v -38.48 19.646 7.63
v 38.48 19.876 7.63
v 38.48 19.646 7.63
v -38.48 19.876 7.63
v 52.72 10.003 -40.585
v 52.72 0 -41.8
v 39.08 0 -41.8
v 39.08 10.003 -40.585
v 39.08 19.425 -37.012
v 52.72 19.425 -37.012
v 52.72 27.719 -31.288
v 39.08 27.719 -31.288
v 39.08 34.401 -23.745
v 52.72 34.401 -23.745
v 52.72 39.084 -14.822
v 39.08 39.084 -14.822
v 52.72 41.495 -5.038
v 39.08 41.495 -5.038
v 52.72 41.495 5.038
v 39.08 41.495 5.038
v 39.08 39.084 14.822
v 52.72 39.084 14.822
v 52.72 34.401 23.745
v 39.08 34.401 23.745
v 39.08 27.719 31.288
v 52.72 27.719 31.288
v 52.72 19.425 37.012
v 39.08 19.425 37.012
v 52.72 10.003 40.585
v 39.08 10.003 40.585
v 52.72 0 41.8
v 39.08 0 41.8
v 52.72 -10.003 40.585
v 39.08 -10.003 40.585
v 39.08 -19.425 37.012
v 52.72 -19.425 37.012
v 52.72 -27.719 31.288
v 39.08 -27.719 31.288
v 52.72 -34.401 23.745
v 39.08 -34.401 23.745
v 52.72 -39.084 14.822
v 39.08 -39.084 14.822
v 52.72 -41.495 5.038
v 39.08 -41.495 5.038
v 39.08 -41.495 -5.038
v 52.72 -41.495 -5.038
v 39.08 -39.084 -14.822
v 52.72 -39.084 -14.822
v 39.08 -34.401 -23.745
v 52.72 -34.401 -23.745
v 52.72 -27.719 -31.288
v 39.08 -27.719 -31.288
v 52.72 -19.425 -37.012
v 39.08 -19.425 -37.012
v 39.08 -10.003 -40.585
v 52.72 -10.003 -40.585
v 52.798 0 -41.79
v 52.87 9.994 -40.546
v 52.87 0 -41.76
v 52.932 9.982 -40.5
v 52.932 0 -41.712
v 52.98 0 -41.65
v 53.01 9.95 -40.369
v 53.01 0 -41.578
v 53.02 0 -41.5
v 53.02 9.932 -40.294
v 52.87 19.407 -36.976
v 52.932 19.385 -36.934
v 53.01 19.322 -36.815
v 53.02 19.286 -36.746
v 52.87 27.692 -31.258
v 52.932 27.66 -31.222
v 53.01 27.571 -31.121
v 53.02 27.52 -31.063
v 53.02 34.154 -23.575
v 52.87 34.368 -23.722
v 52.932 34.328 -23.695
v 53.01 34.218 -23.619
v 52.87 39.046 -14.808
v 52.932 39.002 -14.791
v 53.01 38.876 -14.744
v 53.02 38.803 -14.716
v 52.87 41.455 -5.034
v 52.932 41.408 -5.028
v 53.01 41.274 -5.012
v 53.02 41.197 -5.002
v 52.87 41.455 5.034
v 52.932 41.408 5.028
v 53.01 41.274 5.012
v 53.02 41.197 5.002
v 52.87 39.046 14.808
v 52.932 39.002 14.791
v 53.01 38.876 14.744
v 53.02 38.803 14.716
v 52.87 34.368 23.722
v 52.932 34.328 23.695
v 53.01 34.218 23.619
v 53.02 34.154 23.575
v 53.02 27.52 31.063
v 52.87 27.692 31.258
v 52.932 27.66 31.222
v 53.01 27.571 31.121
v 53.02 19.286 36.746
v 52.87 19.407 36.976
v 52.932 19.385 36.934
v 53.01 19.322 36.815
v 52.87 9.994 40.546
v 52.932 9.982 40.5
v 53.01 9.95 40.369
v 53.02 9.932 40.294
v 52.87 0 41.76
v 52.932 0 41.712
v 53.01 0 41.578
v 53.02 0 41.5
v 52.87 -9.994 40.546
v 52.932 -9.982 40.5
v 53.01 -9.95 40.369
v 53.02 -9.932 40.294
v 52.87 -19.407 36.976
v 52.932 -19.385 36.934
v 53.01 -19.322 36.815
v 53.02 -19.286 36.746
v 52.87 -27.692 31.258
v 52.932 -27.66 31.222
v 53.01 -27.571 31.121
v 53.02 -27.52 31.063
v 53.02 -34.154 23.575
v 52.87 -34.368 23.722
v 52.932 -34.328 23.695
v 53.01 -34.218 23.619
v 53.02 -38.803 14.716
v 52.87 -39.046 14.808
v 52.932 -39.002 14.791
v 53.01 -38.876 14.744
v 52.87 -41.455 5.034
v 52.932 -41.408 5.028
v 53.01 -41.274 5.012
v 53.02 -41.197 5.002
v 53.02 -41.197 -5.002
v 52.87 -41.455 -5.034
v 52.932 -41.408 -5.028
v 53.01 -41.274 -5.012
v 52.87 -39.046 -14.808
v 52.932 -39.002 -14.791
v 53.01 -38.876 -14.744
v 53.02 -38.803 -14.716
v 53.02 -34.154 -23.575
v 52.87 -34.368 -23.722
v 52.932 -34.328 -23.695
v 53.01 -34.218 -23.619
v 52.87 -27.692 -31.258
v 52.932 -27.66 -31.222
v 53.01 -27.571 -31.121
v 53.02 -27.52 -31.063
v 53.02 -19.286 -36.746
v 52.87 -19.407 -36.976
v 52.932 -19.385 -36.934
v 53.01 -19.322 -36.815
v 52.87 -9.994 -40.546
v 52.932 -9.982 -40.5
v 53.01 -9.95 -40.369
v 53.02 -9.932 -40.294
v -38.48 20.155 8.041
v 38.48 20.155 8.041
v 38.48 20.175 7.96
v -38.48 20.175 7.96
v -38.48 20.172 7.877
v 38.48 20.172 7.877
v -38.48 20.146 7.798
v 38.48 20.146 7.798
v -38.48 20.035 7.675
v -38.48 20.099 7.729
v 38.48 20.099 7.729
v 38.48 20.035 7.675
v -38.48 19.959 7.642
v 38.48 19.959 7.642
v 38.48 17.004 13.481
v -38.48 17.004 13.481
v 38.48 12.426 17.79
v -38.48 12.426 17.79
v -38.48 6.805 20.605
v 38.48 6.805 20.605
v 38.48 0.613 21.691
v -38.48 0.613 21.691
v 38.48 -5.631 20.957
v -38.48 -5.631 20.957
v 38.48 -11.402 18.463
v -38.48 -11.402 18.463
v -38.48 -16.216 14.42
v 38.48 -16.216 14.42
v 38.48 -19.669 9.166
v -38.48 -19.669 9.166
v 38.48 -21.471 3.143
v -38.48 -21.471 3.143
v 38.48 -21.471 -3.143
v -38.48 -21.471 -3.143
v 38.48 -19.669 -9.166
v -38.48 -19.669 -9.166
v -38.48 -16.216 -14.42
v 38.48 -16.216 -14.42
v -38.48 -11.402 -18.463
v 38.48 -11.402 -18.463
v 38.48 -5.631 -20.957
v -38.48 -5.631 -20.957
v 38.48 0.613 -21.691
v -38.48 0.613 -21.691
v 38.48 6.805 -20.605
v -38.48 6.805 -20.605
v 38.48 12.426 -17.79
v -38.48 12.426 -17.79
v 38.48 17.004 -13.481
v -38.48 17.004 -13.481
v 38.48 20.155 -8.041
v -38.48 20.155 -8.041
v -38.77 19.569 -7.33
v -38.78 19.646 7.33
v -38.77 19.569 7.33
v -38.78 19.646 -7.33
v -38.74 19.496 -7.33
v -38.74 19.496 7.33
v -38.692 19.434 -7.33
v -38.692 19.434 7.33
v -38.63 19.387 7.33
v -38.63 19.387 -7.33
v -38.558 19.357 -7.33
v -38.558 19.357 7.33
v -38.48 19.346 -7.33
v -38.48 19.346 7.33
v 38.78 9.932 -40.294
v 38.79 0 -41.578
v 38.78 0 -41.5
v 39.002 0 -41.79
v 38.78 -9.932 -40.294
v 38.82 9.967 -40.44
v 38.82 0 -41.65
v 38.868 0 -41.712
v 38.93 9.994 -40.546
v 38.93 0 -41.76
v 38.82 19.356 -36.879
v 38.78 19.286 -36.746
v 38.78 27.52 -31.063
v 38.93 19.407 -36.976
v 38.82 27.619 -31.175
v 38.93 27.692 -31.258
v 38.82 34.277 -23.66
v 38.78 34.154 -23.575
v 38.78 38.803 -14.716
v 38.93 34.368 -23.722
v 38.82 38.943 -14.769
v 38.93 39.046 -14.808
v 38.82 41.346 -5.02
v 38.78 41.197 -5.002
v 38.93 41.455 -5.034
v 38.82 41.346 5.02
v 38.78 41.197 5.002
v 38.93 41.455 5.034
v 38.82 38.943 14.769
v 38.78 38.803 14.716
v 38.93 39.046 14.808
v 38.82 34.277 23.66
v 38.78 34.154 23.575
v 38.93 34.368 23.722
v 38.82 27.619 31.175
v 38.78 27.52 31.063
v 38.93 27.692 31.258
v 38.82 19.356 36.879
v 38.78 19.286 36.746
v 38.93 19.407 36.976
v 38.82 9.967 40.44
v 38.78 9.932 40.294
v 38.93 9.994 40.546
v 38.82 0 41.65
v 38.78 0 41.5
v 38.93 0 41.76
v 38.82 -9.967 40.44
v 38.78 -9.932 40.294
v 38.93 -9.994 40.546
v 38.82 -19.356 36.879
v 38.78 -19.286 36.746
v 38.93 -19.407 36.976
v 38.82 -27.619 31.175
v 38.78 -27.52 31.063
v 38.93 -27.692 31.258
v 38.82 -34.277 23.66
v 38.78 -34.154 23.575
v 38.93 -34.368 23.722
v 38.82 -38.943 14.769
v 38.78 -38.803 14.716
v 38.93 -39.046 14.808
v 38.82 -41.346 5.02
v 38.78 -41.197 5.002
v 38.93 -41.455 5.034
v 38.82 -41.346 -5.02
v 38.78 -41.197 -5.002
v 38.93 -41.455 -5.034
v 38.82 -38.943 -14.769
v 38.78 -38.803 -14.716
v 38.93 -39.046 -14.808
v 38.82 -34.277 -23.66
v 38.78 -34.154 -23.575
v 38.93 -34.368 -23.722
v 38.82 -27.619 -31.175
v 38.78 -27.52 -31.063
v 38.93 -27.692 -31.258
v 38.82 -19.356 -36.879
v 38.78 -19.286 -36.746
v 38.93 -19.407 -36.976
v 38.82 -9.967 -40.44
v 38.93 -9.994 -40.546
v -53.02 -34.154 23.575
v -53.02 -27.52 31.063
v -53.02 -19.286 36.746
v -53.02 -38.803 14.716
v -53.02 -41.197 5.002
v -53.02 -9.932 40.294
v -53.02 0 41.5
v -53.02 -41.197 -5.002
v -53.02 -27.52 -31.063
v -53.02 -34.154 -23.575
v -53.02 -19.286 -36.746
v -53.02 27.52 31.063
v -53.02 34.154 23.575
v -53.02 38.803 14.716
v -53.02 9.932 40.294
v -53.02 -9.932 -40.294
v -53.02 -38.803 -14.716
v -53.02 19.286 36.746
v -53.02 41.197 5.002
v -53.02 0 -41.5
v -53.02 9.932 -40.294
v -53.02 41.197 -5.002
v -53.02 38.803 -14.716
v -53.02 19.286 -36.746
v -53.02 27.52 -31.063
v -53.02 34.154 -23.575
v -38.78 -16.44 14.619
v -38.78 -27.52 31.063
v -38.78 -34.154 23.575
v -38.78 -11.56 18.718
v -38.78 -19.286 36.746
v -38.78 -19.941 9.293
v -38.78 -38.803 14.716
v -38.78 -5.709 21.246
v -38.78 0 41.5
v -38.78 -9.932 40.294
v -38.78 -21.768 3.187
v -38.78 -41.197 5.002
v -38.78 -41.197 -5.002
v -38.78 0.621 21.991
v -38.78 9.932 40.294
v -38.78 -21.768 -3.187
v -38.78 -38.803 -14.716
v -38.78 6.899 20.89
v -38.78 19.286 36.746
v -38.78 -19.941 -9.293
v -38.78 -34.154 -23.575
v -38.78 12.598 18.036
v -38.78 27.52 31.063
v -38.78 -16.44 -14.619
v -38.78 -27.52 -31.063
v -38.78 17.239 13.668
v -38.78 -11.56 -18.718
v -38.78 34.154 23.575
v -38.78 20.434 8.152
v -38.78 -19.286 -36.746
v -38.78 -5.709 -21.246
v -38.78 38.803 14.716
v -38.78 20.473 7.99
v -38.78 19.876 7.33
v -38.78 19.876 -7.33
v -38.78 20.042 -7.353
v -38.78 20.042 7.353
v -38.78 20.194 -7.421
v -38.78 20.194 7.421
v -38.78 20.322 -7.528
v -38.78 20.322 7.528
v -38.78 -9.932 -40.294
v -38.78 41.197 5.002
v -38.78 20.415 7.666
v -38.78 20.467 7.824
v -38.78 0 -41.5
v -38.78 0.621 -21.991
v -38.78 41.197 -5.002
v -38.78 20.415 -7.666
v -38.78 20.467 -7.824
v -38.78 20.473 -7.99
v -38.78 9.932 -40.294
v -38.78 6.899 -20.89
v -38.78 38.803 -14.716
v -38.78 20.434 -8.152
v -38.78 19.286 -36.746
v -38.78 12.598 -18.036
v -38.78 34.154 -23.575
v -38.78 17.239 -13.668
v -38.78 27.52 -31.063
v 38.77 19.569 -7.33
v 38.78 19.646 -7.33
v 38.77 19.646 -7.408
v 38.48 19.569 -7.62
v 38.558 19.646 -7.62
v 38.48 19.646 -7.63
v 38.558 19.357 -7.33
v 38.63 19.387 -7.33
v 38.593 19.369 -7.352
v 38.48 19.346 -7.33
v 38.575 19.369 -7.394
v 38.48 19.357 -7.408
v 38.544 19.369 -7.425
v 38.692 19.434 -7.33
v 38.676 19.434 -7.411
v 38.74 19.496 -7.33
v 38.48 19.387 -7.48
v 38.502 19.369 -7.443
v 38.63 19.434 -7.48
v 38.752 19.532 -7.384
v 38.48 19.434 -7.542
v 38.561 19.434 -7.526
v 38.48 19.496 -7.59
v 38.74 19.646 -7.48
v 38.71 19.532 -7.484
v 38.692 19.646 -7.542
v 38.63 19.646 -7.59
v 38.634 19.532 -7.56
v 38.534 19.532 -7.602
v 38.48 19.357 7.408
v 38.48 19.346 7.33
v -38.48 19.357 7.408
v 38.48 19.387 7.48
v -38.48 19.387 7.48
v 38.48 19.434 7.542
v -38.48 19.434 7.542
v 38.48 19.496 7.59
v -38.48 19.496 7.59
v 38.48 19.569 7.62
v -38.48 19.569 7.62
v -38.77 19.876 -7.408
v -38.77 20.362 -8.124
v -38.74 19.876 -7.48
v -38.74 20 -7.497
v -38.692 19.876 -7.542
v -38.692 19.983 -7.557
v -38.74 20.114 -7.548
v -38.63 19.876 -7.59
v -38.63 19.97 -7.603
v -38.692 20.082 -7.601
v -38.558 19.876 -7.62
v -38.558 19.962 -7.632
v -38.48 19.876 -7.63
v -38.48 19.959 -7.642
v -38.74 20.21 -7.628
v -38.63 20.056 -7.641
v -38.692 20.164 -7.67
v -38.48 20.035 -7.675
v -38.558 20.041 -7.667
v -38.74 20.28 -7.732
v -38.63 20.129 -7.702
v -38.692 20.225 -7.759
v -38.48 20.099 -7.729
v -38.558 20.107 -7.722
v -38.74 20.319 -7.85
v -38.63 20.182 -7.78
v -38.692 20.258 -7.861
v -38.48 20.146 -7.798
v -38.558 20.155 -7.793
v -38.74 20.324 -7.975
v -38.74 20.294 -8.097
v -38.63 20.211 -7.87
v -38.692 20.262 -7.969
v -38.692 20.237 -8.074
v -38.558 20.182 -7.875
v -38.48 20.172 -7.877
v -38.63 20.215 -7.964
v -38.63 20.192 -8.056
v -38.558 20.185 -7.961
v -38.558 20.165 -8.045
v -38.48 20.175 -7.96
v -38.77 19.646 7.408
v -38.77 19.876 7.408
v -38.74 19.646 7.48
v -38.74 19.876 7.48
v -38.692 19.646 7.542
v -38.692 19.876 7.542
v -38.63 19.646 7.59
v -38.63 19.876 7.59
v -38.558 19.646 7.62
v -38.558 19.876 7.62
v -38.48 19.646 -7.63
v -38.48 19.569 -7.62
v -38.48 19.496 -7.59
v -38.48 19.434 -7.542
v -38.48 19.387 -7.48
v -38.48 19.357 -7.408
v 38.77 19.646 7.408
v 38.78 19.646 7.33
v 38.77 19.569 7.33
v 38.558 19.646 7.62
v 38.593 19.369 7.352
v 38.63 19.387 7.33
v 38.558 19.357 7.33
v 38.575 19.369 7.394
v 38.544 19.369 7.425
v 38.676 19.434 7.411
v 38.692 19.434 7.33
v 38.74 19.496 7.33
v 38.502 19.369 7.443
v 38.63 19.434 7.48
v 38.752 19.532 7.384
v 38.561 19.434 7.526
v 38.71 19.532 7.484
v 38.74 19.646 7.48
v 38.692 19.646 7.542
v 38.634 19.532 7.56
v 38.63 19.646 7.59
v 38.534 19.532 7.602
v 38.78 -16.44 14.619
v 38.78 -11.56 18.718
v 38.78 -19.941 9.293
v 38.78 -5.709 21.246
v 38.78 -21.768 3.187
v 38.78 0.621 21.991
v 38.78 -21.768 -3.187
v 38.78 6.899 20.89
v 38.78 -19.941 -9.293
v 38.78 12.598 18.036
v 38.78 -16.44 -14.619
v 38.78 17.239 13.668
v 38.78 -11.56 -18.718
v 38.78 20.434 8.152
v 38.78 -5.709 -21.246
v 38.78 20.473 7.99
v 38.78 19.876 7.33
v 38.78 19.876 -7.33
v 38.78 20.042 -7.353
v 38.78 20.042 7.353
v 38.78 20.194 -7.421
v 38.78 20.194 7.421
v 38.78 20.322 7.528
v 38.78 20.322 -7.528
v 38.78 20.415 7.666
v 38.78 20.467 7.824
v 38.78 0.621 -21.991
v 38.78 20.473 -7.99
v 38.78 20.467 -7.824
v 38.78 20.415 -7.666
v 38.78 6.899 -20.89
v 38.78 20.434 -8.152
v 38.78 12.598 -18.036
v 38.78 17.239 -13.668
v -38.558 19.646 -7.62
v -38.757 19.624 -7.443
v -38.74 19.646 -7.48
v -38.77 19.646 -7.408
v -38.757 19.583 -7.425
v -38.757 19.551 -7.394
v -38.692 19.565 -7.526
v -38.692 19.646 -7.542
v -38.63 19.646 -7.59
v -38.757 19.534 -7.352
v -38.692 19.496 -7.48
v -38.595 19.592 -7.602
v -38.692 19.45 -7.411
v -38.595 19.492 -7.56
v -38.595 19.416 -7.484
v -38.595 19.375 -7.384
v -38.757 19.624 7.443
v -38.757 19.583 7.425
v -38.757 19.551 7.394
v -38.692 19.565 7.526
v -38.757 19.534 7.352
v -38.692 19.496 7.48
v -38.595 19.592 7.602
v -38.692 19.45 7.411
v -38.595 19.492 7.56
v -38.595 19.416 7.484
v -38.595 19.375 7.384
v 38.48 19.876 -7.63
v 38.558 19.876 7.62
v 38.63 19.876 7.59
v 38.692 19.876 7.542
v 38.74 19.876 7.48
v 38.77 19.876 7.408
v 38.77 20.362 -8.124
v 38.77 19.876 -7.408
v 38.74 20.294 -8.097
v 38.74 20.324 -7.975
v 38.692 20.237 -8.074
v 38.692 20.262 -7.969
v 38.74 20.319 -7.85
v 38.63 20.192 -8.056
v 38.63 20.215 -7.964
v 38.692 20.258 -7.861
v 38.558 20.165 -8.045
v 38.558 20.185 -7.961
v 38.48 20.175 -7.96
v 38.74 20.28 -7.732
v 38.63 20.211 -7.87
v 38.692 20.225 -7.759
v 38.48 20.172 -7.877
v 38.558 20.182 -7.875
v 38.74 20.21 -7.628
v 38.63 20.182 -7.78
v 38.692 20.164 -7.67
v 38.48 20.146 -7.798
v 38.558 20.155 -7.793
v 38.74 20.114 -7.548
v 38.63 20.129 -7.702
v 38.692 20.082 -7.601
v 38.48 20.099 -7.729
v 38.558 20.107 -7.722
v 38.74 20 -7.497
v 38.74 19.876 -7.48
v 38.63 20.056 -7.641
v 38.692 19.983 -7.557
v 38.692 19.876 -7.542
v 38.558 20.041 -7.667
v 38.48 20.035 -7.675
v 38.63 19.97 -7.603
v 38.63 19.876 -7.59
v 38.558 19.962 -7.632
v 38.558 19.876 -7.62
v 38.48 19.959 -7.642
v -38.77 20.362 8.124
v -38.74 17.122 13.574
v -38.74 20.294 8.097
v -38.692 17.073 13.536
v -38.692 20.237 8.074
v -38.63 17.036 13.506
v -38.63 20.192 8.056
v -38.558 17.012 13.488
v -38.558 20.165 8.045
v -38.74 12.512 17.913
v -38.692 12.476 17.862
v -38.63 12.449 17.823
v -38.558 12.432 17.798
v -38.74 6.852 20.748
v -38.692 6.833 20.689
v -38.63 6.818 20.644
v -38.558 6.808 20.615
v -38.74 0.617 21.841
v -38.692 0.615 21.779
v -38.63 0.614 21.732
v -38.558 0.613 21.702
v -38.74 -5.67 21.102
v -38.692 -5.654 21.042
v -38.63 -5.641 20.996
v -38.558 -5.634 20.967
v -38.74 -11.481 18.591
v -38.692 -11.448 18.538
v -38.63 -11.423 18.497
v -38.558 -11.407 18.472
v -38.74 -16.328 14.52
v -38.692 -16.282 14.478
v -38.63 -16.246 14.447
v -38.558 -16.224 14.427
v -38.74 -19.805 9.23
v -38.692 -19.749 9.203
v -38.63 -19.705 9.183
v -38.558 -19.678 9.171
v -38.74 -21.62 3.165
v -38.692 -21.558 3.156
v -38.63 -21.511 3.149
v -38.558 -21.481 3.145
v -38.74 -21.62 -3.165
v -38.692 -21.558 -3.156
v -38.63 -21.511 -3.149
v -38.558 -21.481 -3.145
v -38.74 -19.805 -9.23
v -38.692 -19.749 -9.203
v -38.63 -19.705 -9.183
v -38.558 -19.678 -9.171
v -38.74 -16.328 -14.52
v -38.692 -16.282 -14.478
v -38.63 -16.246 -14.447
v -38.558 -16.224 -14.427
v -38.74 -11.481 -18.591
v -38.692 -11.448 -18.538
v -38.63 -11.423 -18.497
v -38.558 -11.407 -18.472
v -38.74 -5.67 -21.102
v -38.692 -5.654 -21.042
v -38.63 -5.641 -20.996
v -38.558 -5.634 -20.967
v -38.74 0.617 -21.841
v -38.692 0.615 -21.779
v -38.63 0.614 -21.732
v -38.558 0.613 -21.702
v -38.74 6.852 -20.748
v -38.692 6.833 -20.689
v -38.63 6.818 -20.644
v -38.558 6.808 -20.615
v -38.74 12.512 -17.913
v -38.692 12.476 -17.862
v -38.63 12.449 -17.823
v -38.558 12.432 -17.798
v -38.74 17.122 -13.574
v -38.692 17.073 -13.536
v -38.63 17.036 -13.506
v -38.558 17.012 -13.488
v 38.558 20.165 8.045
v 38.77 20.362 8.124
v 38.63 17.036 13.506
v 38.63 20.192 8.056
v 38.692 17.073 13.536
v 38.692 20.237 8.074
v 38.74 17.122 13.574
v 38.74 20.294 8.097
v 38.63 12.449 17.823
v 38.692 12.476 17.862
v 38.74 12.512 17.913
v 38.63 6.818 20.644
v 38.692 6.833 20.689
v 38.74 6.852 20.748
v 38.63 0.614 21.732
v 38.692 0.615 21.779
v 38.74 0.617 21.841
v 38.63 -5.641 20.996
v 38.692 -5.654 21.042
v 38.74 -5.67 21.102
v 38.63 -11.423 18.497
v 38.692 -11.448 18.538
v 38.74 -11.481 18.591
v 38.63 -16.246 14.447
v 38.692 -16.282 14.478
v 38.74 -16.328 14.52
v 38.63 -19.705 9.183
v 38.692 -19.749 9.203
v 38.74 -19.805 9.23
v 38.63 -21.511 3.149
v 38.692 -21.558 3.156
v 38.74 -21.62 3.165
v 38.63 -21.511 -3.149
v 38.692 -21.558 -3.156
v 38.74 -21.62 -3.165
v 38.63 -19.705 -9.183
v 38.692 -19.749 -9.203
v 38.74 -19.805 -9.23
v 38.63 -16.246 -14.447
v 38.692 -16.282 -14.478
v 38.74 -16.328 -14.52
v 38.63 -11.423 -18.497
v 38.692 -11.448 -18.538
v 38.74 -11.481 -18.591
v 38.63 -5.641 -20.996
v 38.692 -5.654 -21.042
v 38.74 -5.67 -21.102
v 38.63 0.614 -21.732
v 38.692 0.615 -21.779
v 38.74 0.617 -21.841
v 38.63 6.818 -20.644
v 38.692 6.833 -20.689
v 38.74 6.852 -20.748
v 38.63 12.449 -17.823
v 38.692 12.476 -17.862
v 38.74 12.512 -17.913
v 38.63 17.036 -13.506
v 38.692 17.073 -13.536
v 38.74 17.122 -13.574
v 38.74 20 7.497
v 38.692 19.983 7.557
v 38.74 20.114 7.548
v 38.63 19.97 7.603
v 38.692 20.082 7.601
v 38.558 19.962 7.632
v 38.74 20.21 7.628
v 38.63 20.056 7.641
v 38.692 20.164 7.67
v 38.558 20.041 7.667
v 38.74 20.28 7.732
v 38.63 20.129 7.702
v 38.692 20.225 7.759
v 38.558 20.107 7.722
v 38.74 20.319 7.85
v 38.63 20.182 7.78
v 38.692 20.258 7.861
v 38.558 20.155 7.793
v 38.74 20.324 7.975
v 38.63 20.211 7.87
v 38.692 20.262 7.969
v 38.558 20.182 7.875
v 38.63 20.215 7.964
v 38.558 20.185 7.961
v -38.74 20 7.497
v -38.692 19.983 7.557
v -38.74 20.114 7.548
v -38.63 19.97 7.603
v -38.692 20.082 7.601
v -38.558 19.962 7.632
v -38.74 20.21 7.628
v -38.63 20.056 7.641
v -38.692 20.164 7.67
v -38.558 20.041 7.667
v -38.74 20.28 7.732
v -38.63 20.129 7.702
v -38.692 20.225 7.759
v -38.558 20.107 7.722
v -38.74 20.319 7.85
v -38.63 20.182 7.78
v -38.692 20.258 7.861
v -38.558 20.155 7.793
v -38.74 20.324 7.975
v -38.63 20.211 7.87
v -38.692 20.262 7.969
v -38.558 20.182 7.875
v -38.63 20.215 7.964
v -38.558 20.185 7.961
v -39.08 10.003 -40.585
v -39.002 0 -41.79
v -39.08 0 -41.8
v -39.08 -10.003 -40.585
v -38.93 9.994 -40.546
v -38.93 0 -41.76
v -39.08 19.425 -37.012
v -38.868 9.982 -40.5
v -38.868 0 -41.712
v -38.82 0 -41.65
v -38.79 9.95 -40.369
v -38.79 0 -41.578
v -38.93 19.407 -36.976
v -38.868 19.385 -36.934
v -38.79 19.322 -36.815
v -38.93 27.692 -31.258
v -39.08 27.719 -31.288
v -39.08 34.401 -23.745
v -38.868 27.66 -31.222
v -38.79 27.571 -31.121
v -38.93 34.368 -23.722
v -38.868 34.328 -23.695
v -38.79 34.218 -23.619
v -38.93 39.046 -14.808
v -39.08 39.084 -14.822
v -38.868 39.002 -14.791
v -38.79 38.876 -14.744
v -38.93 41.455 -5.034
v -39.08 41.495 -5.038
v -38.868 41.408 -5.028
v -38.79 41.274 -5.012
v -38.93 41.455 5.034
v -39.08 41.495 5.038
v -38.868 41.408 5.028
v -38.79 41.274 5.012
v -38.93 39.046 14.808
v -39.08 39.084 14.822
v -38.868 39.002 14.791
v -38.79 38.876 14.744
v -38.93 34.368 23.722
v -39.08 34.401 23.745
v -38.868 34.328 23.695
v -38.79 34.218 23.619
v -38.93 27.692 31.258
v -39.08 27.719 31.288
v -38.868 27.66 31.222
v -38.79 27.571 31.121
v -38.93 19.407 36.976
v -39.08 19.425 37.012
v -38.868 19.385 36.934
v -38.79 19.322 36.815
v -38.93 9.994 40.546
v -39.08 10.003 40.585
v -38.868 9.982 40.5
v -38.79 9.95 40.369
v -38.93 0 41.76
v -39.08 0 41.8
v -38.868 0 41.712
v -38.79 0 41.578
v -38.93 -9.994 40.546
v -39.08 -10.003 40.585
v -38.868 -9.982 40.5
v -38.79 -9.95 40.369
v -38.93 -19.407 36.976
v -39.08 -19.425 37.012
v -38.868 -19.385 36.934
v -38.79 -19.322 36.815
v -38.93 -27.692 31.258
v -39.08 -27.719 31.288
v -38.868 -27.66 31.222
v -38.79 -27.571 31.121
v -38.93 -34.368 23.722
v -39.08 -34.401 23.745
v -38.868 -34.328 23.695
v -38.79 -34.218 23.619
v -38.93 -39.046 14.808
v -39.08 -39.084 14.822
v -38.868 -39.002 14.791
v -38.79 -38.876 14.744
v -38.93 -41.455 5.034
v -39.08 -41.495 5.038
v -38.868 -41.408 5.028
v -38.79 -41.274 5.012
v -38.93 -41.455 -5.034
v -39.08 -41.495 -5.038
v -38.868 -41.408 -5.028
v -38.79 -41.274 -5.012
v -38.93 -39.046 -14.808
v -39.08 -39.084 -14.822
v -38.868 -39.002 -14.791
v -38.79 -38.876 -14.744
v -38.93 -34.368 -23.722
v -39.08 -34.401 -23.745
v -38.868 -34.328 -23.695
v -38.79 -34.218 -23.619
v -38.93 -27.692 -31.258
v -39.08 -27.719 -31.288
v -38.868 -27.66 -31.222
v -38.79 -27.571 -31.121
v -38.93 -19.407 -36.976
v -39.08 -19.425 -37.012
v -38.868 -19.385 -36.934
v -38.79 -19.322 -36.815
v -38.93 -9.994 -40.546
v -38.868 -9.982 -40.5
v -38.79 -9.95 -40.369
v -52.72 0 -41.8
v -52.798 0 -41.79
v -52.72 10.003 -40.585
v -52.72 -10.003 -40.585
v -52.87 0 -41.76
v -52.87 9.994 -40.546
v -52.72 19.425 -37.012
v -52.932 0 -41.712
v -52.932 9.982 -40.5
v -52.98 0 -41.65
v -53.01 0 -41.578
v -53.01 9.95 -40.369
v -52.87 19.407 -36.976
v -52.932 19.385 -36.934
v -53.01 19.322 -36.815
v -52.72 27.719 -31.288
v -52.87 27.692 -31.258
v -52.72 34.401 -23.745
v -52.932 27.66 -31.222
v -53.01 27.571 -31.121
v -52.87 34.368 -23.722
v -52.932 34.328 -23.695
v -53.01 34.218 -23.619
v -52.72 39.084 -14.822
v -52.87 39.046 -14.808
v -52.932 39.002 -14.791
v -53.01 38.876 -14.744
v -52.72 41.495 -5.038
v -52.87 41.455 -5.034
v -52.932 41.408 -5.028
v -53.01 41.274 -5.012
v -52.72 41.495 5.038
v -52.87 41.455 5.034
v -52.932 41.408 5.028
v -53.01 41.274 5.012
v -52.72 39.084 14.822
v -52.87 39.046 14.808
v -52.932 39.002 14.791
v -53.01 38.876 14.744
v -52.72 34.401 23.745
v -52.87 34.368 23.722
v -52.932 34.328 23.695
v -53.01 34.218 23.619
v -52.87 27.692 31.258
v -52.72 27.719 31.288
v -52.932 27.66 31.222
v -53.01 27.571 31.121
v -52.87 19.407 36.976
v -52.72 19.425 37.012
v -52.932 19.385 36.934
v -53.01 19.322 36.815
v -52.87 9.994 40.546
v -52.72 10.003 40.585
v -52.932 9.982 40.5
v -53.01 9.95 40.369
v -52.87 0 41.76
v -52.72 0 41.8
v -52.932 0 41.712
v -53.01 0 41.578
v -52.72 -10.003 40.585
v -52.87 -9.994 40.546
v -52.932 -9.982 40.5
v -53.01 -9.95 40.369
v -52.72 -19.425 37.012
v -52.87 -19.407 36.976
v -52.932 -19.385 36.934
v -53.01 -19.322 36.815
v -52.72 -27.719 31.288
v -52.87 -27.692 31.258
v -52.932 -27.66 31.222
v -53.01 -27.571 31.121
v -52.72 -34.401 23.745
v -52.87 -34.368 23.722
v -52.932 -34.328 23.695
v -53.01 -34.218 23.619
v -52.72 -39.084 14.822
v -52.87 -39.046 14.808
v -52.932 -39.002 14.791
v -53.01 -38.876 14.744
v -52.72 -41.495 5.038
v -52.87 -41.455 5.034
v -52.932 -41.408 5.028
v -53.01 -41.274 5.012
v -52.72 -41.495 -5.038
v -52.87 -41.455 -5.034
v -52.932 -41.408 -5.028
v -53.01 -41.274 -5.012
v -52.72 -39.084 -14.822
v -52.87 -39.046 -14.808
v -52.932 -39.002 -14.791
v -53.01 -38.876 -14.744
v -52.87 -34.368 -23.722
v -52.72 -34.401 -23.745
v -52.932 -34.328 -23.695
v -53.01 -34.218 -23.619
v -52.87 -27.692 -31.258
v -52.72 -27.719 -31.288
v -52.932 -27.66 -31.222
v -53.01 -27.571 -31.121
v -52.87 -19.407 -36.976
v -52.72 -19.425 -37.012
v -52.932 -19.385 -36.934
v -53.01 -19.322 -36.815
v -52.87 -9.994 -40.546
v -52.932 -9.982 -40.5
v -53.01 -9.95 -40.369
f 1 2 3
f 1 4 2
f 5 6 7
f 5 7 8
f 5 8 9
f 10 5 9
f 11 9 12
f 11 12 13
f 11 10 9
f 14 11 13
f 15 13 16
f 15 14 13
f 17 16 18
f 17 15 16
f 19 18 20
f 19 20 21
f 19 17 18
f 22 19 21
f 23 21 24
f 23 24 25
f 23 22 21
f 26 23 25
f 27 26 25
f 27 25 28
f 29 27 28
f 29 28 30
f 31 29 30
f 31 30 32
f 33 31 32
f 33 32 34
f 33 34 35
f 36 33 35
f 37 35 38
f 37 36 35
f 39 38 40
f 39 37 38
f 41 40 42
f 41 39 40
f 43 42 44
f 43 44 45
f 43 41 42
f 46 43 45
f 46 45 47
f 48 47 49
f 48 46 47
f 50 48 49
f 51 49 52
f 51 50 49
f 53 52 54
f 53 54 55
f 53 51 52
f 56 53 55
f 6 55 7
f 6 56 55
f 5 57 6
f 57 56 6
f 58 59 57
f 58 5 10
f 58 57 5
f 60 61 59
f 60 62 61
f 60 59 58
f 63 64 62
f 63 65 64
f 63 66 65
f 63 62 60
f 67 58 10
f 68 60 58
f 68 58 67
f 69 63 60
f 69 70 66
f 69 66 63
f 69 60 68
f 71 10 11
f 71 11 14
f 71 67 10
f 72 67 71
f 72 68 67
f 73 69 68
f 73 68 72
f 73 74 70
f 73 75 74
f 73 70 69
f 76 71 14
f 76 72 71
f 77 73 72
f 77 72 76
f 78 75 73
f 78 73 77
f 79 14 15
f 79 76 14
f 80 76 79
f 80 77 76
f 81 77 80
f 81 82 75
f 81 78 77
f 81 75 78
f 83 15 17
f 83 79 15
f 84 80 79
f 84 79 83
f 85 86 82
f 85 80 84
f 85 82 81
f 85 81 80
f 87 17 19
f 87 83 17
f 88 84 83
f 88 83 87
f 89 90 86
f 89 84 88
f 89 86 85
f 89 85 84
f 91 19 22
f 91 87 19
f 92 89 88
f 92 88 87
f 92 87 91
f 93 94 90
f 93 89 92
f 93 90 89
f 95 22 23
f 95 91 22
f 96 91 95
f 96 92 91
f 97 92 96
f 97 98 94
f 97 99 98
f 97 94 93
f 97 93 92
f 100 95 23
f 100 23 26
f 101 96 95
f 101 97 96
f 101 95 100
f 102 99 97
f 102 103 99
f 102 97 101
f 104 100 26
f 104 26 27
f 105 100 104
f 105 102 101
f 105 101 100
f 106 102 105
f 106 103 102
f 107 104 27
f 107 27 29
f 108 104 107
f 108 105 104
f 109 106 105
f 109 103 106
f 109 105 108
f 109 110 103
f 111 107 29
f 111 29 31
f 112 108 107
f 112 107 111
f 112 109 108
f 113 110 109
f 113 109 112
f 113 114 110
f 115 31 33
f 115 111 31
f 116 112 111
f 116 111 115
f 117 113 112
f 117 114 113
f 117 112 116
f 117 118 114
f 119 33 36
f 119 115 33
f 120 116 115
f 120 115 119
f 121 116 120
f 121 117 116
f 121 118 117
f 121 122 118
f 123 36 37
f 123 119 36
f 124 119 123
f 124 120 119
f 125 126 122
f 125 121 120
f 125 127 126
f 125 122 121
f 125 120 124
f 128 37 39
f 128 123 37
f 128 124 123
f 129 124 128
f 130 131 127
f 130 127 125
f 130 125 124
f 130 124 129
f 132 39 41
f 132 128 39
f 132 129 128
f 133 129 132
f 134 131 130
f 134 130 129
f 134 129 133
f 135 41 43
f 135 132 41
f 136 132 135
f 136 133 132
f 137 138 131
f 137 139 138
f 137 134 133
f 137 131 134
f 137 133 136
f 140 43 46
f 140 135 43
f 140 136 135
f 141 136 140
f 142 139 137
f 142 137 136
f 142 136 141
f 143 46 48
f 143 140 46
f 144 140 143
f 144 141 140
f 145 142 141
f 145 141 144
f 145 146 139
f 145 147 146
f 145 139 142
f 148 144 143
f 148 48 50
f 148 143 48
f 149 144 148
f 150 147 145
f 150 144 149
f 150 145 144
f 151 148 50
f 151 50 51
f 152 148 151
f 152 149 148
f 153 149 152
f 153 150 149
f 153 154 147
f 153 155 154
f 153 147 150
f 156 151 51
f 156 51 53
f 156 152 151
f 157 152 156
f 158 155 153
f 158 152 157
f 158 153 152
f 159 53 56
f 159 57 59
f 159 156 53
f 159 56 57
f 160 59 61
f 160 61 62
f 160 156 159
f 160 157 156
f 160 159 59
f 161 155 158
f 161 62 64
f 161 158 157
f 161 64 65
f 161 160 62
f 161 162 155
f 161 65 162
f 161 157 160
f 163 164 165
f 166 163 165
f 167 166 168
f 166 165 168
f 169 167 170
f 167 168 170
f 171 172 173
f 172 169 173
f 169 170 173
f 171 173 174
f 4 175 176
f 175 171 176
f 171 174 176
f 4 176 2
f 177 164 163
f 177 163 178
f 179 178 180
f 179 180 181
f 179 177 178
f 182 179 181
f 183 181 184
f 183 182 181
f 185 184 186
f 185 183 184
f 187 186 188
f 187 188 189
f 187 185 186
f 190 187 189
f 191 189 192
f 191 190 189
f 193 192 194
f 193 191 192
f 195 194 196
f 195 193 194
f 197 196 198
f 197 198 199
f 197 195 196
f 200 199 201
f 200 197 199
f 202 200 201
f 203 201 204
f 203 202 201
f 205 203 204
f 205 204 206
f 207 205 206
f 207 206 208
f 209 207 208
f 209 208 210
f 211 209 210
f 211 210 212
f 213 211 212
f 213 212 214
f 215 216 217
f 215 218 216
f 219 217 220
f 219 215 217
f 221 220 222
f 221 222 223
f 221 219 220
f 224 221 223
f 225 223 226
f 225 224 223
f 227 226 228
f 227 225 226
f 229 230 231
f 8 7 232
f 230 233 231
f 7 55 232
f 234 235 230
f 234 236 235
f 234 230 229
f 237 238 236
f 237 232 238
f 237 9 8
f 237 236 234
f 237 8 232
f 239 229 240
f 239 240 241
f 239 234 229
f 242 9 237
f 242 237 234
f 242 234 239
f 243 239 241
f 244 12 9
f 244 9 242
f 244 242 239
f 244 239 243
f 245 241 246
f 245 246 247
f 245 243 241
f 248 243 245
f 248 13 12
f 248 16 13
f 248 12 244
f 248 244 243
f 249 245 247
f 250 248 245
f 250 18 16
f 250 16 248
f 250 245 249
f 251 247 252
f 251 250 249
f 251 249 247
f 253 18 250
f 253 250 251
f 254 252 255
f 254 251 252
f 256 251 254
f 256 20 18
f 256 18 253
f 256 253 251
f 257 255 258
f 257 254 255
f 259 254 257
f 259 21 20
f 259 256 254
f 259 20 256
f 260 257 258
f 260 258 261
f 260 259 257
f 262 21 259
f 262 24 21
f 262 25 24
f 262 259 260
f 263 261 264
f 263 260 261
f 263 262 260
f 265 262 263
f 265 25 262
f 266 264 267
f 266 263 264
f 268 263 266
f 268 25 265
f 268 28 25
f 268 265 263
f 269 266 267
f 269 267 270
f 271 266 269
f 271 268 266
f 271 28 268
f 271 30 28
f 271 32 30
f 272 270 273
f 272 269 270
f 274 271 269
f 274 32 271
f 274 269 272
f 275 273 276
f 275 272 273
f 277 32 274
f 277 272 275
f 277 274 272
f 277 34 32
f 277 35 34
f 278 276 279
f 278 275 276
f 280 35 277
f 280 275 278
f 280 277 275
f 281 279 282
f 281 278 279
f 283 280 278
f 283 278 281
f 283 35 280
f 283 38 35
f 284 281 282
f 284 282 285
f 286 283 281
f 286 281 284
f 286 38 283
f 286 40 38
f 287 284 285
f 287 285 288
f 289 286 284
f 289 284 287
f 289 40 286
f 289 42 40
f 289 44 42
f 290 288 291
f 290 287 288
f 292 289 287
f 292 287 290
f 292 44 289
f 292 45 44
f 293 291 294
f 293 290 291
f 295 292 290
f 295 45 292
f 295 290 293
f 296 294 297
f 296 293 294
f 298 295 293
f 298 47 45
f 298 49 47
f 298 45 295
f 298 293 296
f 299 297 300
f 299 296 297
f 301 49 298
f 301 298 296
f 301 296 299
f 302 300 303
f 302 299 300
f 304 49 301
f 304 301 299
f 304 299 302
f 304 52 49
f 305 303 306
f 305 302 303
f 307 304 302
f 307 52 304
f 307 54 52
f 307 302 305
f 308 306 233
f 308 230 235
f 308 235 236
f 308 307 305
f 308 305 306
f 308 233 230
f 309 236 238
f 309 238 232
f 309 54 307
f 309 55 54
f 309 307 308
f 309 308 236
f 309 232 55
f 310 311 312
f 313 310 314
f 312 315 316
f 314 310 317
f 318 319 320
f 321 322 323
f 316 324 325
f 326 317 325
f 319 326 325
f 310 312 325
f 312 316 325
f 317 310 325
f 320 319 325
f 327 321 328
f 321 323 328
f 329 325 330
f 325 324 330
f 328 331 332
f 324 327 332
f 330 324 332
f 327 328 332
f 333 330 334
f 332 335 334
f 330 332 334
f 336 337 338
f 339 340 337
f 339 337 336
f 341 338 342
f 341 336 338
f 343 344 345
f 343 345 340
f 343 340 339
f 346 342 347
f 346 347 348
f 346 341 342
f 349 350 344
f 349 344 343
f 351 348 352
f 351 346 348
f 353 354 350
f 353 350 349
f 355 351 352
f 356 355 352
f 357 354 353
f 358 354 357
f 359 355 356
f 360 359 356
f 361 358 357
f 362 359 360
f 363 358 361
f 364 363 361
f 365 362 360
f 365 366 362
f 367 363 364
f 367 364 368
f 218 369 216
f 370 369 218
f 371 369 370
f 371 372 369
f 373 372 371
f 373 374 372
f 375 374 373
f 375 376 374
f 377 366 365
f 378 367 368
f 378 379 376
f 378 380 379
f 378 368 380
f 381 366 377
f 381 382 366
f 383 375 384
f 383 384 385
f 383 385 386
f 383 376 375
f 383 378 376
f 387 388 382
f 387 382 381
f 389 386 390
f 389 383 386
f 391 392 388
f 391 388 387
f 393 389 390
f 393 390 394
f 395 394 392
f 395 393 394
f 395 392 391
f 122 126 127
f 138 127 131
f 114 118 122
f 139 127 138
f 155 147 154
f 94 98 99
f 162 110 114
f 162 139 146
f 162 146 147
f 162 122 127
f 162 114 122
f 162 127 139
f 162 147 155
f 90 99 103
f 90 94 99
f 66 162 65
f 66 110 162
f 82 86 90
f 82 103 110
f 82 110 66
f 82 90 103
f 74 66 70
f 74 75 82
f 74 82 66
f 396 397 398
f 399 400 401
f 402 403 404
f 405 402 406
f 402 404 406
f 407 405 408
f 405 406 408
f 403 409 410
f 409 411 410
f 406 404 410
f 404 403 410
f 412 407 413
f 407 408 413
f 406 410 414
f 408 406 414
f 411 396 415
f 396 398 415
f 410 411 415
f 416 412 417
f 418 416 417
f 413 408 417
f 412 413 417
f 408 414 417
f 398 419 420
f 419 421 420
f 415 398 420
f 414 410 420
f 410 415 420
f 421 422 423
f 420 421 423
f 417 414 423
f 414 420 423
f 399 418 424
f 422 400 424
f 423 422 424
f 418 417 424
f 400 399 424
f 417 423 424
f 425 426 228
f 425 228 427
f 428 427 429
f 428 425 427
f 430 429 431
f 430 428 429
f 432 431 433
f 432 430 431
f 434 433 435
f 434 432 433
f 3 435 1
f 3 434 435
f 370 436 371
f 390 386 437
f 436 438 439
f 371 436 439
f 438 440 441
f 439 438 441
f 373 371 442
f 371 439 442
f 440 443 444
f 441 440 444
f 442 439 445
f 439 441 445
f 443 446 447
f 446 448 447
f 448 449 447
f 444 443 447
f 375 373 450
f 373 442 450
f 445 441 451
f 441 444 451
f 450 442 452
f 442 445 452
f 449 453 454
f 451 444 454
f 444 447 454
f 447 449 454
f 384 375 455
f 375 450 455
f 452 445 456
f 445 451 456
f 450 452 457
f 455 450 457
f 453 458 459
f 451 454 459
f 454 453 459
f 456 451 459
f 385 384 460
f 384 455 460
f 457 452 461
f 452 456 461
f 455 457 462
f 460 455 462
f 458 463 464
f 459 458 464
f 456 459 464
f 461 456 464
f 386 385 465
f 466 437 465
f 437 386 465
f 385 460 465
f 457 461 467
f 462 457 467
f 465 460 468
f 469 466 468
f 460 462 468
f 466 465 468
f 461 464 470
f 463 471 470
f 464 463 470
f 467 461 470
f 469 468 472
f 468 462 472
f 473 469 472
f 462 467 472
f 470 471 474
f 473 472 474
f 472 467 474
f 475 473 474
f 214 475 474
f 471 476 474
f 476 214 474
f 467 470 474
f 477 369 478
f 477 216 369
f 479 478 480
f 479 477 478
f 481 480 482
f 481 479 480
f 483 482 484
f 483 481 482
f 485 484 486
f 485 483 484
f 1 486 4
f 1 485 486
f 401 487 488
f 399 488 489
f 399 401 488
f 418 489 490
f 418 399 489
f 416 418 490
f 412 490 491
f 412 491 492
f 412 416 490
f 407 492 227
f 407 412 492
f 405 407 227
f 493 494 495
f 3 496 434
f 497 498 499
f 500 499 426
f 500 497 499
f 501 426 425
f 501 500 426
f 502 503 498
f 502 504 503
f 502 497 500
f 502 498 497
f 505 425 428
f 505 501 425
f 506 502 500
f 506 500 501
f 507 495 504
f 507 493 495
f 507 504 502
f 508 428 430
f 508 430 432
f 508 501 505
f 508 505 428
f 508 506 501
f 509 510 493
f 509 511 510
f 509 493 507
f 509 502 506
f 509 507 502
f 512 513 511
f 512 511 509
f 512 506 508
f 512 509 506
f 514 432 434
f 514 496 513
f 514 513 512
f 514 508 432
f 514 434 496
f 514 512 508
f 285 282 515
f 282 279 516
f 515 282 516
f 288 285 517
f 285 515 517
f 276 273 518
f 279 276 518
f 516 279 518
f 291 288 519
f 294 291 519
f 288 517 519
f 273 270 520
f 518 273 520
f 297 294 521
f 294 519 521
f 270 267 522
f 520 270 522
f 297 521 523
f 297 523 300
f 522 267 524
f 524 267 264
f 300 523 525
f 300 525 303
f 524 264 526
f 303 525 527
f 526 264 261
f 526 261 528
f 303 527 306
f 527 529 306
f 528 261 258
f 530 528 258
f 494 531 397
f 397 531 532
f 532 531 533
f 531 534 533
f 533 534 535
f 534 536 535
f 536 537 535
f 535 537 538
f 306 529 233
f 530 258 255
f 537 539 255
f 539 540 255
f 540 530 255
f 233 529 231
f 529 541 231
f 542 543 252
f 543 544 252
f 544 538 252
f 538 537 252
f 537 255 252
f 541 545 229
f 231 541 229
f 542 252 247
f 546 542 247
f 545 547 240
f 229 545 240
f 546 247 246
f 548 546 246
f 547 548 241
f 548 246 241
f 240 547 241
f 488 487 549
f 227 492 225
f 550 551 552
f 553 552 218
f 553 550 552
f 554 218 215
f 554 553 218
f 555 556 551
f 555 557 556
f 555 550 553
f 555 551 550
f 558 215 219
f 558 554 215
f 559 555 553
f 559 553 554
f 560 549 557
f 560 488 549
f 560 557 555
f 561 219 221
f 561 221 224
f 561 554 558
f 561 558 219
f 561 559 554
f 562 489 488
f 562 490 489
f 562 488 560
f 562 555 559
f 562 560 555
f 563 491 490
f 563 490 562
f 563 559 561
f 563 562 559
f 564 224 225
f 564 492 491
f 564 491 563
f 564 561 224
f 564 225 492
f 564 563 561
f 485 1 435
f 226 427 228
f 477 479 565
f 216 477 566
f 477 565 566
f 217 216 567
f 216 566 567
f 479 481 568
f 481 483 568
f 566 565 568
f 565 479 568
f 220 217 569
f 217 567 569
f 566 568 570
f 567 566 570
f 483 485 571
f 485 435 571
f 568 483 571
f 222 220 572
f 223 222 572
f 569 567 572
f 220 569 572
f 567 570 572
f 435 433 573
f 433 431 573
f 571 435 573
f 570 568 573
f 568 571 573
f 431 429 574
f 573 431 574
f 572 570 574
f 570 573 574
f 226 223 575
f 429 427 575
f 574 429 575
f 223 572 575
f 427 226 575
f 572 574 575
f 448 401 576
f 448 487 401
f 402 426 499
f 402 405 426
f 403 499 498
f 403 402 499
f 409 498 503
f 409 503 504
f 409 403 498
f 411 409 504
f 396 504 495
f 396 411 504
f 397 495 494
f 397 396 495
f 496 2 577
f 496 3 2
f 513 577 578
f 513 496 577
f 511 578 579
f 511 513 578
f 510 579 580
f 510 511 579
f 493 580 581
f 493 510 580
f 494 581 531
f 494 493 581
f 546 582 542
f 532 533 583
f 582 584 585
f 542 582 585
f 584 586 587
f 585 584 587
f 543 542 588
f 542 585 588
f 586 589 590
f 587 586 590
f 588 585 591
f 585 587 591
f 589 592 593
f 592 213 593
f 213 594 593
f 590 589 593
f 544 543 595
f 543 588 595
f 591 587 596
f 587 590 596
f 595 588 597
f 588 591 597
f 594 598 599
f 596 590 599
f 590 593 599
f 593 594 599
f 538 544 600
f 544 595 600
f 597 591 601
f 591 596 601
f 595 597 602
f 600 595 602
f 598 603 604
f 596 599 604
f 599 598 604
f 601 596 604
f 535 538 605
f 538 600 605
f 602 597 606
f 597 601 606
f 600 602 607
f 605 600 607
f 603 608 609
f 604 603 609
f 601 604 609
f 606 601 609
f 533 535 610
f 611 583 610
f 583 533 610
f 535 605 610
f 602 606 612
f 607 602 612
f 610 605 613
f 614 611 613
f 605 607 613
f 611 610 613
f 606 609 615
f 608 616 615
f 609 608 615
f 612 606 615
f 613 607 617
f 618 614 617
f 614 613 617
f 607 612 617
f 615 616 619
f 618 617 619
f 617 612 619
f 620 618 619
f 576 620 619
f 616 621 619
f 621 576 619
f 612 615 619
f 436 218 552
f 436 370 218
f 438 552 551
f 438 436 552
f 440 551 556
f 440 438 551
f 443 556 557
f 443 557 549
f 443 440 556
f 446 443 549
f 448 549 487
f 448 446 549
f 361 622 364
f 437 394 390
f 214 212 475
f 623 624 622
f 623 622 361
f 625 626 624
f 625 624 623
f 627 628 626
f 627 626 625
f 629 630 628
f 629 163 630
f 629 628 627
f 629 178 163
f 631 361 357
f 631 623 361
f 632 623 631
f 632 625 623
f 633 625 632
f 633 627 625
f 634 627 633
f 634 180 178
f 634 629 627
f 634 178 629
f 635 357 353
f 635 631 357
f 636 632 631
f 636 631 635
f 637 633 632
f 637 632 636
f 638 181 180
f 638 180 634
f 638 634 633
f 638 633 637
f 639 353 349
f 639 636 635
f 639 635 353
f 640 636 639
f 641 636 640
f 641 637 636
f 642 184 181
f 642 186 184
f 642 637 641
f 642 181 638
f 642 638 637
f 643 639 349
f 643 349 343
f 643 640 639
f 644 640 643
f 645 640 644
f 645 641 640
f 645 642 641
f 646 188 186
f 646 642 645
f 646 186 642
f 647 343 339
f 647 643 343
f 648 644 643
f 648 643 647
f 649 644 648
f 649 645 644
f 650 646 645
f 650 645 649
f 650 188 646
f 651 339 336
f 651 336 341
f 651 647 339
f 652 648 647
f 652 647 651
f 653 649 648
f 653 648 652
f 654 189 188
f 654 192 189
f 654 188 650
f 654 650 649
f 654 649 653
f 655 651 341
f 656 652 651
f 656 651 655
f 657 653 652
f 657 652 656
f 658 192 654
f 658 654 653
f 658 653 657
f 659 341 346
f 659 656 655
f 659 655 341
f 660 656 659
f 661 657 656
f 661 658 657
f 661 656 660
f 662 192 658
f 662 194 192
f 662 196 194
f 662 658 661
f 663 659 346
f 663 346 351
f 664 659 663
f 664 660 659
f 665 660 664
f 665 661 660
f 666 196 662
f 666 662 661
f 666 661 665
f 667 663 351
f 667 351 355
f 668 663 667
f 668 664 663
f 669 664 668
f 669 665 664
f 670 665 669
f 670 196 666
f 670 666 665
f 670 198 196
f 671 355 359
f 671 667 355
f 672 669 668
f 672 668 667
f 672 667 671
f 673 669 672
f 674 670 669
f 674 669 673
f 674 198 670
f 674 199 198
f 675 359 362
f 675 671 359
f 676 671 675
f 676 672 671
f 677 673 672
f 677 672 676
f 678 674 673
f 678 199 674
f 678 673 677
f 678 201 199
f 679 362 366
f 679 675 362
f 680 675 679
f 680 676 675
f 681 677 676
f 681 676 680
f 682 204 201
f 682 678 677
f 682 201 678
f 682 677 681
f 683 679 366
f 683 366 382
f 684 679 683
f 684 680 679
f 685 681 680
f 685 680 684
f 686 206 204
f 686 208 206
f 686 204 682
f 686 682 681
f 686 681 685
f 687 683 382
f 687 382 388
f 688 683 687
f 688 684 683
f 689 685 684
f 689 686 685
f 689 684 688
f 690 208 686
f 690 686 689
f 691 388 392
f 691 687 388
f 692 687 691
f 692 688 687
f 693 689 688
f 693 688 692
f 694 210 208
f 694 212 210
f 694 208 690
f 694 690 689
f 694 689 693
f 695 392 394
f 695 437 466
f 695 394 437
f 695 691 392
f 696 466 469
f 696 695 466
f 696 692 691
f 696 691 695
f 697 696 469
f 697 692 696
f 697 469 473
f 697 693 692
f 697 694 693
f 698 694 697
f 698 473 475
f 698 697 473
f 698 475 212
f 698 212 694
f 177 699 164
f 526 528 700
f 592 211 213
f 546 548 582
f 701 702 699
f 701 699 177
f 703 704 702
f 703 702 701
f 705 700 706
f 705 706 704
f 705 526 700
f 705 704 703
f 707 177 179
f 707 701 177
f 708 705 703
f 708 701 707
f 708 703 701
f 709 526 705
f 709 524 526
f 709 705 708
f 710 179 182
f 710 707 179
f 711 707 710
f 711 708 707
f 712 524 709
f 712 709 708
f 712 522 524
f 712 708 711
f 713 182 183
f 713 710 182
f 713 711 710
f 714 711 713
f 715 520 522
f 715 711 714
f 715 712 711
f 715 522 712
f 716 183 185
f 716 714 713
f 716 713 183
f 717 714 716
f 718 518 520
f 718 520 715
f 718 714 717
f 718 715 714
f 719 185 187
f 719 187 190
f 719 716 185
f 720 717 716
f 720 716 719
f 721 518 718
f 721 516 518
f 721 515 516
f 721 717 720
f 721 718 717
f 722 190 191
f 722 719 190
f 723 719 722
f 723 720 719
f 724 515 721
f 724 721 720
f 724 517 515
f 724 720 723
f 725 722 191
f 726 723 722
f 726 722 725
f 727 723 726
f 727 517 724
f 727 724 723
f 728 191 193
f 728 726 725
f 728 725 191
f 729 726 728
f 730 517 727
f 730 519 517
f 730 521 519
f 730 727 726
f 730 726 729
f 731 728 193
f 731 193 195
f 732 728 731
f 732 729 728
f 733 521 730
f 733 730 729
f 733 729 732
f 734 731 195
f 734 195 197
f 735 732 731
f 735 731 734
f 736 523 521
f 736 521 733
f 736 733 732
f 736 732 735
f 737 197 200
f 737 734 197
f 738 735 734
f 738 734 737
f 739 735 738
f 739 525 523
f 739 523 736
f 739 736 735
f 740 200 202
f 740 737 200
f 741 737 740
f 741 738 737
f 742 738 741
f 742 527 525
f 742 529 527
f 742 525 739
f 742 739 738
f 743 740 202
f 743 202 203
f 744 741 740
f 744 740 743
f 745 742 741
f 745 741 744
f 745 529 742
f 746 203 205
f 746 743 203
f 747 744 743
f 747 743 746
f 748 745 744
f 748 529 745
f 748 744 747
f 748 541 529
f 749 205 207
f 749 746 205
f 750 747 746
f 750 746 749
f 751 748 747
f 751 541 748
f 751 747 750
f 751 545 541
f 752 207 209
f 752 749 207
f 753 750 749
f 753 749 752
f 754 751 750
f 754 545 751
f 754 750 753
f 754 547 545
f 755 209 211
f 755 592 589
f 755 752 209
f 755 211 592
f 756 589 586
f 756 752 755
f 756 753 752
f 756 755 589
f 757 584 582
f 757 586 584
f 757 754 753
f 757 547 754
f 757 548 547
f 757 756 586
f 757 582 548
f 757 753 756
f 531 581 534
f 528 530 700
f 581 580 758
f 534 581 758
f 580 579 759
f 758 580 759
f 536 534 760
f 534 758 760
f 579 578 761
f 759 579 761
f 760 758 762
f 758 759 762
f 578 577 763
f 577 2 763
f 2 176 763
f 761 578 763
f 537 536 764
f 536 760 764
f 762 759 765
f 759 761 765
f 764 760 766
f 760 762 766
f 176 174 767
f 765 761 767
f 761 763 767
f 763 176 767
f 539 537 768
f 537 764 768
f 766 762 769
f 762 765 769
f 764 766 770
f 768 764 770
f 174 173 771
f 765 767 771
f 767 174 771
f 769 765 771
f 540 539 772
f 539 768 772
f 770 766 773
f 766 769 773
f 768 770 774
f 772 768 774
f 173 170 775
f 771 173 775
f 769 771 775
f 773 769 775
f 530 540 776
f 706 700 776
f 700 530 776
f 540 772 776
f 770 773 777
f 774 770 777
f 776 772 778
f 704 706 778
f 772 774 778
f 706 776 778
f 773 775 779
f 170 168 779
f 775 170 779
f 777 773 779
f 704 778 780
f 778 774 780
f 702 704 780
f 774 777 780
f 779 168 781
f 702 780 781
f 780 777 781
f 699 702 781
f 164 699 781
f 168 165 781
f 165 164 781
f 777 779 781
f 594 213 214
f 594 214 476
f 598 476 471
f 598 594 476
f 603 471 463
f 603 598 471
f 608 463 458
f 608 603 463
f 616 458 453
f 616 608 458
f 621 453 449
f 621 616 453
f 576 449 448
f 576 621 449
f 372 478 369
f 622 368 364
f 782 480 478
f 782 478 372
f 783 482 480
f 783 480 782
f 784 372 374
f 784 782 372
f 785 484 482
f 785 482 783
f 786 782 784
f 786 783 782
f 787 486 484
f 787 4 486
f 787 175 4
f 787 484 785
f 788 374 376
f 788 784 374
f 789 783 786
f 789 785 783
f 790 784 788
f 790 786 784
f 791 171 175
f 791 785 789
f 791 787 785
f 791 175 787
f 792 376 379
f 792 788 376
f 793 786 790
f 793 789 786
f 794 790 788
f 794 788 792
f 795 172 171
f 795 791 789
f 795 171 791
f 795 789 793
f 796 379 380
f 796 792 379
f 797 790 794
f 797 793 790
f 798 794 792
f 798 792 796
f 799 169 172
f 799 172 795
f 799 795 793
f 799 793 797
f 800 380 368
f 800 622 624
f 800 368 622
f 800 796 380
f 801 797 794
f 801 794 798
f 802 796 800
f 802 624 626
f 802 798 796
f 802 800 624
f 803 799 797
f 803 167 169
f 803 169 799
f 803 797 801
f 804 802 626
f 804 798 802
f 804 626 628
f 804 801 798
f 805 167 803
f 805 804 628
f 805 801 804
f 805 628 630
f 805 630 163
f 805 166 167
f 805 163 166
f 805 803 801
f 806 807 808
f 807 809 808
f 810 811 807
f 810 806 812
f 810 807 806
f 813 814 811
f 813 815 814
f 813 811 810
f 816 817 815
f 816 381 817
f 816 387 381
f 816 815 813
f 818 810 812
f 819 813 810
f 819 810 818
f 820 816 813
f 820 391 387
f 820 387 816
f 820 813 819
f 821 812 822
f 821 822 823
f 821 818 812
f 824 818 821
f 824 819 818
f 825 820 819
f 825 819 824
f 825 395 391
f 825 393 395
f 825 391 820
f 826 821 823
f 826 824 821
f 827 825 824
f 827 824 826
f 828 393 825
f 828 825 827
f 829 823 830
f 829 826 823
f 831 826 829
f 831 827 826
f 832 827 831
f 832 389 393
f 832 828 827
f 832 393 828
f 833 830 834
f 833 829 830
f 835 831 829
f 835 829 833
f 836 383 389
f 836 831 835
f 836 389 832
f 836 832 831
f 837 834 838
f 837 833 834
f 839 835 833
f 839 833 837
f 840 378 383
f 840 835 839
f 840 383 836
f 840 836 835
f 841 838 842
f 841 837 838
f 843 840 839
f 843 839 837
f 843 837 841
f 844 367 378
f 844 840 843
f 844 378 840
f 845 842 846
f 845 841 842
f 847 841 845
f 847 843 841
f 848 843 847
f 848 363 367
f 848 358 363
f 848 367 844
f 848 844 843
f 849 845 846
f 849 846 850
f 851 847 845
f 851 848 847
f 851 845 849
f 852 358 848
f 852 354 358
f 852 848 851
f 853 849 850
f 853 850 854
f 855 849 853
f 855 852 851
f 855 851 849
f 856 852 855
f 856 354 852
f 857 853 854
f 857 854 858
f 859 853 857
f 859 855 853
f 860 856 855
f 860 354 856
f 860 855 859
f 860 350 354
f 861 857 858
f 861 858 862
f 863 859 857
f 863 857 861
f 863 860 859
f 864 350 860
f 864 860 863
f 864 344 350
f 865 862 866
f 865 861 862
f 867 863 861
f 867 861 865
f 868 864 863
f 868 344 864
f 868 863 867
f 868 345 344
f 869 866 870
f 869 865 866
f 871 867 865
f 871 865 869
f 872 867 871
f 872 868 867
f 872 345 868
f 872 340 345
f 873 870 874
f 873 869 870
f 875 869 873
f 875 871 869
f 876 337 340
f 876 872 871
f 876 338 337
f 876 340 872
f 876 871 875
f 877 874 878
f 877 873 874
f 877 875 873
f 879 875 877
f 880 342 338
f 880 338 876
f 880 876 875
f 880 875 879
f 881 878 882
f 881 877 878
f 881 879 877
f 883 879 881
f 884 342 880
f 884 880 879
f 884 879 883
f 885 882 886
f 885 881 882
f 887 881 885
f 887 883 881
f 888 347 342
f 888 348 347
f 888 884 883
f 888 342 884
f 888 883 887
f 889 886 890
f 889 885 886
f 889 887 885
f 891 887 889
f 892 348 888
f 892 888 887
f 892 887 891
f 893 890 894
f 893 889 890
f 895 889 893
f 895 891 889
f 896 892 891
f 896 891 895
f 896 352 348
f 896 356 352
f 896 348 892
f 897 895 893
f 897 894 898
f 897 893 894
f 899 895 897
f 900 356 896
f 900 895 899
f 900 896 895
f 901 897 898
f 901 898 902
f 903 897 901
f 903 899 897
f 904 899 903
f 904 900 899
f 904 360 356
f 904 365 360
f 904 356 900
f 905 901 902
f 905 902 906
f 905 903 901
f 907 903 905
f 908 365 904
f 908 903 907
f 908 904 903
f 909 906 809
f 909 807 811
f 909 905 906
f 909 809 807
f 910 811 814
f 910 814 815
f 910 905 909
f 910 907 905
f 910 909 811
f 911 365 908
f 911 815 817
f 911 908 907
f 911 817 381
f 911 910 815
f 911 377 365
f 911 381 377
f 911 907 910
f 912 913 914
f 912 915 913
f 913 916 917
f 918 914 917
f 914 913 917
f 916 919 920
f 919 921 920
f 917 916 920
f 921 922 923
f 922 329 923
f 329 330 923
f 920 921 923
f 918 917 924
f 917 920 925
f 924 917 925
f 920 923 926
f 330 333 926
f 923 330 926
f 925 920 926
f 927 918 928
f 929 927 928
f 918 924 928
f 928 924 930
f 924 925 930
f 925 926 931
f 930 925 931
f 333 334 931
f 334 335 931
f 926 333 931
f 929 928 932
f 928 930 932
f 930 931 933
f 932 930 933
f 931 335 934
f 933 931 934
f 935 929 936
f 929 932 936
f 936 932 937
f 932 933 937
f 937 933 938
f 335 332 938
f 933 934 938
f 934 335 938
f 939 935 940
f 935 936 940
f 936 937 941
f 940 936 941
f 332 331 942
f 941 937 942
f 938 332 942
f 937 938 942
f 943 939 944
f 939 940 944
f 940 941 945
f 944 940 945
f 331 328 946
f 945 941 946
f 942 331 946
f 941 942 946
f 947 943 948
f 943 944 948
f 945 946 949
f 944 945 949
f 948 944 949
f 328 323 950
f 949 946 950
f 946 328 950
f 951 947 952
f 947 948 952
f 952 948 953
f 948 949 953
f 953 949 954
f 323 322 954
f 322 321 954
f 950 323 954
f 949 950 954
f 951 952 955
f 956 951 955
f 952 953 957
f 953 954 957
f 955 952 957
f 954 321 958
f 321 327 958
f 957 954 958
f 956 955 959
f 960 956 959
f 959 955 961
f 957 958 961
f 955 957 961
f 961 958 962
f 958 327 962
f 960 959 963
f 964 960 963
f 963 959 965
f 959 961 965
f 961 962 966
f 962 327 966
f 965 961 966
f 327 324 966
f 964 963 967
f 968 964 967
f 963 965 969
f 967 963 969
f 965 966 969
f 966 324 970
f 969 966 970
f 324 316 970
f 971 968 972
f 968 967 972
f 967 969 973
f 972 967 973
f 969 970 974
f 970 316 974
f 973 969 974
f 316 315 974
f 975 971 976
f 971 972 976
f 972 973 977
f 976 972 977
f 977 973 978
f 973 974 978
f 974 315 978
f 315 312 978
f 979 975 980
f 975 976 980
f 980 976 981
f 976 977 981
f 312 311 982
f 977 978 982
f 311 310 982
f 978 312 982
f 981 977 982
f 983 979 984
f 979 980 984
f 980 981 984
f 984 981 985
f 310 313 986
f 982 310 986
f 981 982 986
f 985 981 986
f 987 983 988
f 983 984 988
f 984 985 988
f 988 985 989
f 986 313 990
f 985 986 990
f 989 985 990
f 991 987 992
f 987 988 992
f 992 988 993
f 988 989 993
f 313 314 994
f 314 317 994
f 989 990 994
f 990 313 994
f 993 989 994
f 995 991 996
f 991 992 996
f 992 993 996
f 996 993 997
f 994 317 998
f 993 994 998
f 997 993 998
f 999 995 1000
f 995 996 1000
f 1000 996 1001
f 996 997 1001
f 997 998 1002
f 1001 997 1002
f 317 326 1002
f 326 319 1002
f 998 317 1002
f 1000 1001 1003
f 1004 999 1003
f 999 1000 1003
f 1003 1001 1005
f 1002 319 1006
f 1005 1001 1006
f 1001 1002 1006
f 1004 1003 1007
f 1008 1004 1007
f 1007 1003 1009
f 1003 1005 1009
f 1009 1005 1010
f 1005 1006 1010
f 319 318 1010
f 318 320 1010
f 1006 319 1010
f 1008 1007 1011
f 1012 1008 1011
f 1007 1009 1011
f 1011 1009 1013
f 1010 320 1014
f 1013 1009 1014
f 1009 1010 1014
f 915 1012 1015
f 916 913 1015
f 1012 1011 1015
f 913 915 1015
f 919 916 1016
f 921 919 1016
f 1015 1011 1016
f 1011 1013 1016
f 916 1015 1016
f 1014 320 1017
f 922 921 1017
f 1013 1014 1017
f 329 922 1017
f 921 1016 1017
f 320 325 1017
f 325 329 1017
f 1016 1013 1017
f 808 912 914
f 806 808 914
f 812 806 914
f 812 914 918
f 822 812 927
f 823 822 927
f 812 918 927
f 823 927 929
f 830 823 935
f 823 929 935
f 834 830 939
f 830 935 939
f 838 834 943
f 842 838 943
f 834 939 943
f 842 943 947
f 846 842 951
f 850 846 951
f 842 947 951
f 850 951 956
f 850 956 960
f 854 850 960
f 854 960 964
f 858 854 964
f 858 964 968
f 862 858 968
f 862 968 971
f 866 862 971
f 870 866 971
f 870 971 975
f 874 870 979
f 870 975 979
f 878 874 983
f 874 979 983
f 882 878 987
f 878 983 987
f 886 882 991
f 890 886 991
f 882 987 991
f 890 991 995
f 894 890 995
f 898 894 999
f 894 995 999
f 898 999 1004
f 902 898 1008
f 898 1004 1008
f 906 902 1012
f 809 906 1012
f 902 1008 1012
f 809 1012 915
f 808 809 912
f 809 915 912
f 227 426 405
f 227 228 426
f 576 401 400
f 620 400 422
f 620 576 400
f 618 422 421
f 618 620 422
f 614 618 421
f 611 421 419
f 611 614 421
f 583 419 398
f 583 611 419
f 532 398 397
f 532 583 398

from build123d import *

# Parameters (mm, degrees)
SKETCH4_R               = 21.7
BOSS_EXTRUDE5_DEPTH     = 53.02
CUT_EXTRUDE1_DEPTH      = 111.391401839
CUT_EXTRUDE1_DEPTH_BACK = 111.391401839
SKETCH5_R               = 41.8
BOSS_EXTRUDE6_DEPTH     = 14.24
FILLET1_R               = 0.3


with BuildPart() as part:
    # Sketch4 → Boss-Extrude5 (new, symmetric)
    with BuildSketch(Plane(origin=(0, 0, 0), x_dir=(0, 0, -1), z_dir=(1, 0, 0))):
        with Locations(Location((0, 0, 0), (0, 0, 180))):
            Circle(SKETCH4_R)
    extrude(amount=BOSS_EXTRUDE5_DEPTH, both=True)

    # Sketch6 → Cut-Extrude1 (cut, two sides: drawn at the far end of the back side and taken through both)
    with BuildSketch(Plane(origin=(53.02, 0, 0), x_dir=(0, 0, -1), z_dir=(1, 0, 0)).offset(-CUT_EXTRUDE1_DEPTH_BACK)):
        with BuildLine():
            Line((-7.63, 20.314356992), (-7.63, 19.346381851))
            Line((-7.63, 19.346381851), (7.63, 19.346381851))
            Line((7.63, 19.346381851), (7.63, 20.314356992))
            ThreePointArc((7.63, 20.314356992), (0, 21.7), (-7.63, 20.314356992))
        make_face()
    extrude(amount=CUT_EXTRUDE1_DEPTH + CUT_EXTRUDE1_DEPTH_BACK, mode=Mode.SUBTRACT)

    # Sketch5 → Boss-Extrude6 (add)
    with BuildSketch(Plane(origin=(53.02, 0, 0), x_dir=(0, 0, -1), z_dir=(1, 0, 0))):
        Circle(SKETCH5_R)
    boss_extrude6 = extrude(amount=-BOSS_EXTRUDE6_DEPTH)

    # Mirror3: Boss-Extrude6 across plane
    add(boss_extrude6.mirror(Plane(origin=(0, 0, 0), x_dir=(0, 0, 1), z_dir=(1, 0, 0))))

    # Fillet1
    fillet1_edges = [part.edges().sort_by_distance(p)[0] for p in [
        (38.78, 19.830369422, 7.63),
        (38.78, -21.7, 0),
        (38.78, 19.830369422, -7.63),
        (38.78, 19.346381851, 0),
        (53.02, 0, 41.8),
        (38.78, 0, 41.8),
        (0, 19.346381851, 7.63),
        (0, 20.314356992, 7.63),
        (-38.78, 19.830369422, 7.63),
        (0, 19.346381851, -7.63),
        (0, 20.314356992, -7.63),
        (-38.78, 0, 41.8),
        (-38.78, 19.830369422, -7.63),
        (-38.78, -21.7, 0),
        (-38.78, 19.346381851, 0),
        (-53.02, 0, 41.8),
    ]]
    fillet(fillet1_edges, radius=FILLET1_R)


solid = part.part
